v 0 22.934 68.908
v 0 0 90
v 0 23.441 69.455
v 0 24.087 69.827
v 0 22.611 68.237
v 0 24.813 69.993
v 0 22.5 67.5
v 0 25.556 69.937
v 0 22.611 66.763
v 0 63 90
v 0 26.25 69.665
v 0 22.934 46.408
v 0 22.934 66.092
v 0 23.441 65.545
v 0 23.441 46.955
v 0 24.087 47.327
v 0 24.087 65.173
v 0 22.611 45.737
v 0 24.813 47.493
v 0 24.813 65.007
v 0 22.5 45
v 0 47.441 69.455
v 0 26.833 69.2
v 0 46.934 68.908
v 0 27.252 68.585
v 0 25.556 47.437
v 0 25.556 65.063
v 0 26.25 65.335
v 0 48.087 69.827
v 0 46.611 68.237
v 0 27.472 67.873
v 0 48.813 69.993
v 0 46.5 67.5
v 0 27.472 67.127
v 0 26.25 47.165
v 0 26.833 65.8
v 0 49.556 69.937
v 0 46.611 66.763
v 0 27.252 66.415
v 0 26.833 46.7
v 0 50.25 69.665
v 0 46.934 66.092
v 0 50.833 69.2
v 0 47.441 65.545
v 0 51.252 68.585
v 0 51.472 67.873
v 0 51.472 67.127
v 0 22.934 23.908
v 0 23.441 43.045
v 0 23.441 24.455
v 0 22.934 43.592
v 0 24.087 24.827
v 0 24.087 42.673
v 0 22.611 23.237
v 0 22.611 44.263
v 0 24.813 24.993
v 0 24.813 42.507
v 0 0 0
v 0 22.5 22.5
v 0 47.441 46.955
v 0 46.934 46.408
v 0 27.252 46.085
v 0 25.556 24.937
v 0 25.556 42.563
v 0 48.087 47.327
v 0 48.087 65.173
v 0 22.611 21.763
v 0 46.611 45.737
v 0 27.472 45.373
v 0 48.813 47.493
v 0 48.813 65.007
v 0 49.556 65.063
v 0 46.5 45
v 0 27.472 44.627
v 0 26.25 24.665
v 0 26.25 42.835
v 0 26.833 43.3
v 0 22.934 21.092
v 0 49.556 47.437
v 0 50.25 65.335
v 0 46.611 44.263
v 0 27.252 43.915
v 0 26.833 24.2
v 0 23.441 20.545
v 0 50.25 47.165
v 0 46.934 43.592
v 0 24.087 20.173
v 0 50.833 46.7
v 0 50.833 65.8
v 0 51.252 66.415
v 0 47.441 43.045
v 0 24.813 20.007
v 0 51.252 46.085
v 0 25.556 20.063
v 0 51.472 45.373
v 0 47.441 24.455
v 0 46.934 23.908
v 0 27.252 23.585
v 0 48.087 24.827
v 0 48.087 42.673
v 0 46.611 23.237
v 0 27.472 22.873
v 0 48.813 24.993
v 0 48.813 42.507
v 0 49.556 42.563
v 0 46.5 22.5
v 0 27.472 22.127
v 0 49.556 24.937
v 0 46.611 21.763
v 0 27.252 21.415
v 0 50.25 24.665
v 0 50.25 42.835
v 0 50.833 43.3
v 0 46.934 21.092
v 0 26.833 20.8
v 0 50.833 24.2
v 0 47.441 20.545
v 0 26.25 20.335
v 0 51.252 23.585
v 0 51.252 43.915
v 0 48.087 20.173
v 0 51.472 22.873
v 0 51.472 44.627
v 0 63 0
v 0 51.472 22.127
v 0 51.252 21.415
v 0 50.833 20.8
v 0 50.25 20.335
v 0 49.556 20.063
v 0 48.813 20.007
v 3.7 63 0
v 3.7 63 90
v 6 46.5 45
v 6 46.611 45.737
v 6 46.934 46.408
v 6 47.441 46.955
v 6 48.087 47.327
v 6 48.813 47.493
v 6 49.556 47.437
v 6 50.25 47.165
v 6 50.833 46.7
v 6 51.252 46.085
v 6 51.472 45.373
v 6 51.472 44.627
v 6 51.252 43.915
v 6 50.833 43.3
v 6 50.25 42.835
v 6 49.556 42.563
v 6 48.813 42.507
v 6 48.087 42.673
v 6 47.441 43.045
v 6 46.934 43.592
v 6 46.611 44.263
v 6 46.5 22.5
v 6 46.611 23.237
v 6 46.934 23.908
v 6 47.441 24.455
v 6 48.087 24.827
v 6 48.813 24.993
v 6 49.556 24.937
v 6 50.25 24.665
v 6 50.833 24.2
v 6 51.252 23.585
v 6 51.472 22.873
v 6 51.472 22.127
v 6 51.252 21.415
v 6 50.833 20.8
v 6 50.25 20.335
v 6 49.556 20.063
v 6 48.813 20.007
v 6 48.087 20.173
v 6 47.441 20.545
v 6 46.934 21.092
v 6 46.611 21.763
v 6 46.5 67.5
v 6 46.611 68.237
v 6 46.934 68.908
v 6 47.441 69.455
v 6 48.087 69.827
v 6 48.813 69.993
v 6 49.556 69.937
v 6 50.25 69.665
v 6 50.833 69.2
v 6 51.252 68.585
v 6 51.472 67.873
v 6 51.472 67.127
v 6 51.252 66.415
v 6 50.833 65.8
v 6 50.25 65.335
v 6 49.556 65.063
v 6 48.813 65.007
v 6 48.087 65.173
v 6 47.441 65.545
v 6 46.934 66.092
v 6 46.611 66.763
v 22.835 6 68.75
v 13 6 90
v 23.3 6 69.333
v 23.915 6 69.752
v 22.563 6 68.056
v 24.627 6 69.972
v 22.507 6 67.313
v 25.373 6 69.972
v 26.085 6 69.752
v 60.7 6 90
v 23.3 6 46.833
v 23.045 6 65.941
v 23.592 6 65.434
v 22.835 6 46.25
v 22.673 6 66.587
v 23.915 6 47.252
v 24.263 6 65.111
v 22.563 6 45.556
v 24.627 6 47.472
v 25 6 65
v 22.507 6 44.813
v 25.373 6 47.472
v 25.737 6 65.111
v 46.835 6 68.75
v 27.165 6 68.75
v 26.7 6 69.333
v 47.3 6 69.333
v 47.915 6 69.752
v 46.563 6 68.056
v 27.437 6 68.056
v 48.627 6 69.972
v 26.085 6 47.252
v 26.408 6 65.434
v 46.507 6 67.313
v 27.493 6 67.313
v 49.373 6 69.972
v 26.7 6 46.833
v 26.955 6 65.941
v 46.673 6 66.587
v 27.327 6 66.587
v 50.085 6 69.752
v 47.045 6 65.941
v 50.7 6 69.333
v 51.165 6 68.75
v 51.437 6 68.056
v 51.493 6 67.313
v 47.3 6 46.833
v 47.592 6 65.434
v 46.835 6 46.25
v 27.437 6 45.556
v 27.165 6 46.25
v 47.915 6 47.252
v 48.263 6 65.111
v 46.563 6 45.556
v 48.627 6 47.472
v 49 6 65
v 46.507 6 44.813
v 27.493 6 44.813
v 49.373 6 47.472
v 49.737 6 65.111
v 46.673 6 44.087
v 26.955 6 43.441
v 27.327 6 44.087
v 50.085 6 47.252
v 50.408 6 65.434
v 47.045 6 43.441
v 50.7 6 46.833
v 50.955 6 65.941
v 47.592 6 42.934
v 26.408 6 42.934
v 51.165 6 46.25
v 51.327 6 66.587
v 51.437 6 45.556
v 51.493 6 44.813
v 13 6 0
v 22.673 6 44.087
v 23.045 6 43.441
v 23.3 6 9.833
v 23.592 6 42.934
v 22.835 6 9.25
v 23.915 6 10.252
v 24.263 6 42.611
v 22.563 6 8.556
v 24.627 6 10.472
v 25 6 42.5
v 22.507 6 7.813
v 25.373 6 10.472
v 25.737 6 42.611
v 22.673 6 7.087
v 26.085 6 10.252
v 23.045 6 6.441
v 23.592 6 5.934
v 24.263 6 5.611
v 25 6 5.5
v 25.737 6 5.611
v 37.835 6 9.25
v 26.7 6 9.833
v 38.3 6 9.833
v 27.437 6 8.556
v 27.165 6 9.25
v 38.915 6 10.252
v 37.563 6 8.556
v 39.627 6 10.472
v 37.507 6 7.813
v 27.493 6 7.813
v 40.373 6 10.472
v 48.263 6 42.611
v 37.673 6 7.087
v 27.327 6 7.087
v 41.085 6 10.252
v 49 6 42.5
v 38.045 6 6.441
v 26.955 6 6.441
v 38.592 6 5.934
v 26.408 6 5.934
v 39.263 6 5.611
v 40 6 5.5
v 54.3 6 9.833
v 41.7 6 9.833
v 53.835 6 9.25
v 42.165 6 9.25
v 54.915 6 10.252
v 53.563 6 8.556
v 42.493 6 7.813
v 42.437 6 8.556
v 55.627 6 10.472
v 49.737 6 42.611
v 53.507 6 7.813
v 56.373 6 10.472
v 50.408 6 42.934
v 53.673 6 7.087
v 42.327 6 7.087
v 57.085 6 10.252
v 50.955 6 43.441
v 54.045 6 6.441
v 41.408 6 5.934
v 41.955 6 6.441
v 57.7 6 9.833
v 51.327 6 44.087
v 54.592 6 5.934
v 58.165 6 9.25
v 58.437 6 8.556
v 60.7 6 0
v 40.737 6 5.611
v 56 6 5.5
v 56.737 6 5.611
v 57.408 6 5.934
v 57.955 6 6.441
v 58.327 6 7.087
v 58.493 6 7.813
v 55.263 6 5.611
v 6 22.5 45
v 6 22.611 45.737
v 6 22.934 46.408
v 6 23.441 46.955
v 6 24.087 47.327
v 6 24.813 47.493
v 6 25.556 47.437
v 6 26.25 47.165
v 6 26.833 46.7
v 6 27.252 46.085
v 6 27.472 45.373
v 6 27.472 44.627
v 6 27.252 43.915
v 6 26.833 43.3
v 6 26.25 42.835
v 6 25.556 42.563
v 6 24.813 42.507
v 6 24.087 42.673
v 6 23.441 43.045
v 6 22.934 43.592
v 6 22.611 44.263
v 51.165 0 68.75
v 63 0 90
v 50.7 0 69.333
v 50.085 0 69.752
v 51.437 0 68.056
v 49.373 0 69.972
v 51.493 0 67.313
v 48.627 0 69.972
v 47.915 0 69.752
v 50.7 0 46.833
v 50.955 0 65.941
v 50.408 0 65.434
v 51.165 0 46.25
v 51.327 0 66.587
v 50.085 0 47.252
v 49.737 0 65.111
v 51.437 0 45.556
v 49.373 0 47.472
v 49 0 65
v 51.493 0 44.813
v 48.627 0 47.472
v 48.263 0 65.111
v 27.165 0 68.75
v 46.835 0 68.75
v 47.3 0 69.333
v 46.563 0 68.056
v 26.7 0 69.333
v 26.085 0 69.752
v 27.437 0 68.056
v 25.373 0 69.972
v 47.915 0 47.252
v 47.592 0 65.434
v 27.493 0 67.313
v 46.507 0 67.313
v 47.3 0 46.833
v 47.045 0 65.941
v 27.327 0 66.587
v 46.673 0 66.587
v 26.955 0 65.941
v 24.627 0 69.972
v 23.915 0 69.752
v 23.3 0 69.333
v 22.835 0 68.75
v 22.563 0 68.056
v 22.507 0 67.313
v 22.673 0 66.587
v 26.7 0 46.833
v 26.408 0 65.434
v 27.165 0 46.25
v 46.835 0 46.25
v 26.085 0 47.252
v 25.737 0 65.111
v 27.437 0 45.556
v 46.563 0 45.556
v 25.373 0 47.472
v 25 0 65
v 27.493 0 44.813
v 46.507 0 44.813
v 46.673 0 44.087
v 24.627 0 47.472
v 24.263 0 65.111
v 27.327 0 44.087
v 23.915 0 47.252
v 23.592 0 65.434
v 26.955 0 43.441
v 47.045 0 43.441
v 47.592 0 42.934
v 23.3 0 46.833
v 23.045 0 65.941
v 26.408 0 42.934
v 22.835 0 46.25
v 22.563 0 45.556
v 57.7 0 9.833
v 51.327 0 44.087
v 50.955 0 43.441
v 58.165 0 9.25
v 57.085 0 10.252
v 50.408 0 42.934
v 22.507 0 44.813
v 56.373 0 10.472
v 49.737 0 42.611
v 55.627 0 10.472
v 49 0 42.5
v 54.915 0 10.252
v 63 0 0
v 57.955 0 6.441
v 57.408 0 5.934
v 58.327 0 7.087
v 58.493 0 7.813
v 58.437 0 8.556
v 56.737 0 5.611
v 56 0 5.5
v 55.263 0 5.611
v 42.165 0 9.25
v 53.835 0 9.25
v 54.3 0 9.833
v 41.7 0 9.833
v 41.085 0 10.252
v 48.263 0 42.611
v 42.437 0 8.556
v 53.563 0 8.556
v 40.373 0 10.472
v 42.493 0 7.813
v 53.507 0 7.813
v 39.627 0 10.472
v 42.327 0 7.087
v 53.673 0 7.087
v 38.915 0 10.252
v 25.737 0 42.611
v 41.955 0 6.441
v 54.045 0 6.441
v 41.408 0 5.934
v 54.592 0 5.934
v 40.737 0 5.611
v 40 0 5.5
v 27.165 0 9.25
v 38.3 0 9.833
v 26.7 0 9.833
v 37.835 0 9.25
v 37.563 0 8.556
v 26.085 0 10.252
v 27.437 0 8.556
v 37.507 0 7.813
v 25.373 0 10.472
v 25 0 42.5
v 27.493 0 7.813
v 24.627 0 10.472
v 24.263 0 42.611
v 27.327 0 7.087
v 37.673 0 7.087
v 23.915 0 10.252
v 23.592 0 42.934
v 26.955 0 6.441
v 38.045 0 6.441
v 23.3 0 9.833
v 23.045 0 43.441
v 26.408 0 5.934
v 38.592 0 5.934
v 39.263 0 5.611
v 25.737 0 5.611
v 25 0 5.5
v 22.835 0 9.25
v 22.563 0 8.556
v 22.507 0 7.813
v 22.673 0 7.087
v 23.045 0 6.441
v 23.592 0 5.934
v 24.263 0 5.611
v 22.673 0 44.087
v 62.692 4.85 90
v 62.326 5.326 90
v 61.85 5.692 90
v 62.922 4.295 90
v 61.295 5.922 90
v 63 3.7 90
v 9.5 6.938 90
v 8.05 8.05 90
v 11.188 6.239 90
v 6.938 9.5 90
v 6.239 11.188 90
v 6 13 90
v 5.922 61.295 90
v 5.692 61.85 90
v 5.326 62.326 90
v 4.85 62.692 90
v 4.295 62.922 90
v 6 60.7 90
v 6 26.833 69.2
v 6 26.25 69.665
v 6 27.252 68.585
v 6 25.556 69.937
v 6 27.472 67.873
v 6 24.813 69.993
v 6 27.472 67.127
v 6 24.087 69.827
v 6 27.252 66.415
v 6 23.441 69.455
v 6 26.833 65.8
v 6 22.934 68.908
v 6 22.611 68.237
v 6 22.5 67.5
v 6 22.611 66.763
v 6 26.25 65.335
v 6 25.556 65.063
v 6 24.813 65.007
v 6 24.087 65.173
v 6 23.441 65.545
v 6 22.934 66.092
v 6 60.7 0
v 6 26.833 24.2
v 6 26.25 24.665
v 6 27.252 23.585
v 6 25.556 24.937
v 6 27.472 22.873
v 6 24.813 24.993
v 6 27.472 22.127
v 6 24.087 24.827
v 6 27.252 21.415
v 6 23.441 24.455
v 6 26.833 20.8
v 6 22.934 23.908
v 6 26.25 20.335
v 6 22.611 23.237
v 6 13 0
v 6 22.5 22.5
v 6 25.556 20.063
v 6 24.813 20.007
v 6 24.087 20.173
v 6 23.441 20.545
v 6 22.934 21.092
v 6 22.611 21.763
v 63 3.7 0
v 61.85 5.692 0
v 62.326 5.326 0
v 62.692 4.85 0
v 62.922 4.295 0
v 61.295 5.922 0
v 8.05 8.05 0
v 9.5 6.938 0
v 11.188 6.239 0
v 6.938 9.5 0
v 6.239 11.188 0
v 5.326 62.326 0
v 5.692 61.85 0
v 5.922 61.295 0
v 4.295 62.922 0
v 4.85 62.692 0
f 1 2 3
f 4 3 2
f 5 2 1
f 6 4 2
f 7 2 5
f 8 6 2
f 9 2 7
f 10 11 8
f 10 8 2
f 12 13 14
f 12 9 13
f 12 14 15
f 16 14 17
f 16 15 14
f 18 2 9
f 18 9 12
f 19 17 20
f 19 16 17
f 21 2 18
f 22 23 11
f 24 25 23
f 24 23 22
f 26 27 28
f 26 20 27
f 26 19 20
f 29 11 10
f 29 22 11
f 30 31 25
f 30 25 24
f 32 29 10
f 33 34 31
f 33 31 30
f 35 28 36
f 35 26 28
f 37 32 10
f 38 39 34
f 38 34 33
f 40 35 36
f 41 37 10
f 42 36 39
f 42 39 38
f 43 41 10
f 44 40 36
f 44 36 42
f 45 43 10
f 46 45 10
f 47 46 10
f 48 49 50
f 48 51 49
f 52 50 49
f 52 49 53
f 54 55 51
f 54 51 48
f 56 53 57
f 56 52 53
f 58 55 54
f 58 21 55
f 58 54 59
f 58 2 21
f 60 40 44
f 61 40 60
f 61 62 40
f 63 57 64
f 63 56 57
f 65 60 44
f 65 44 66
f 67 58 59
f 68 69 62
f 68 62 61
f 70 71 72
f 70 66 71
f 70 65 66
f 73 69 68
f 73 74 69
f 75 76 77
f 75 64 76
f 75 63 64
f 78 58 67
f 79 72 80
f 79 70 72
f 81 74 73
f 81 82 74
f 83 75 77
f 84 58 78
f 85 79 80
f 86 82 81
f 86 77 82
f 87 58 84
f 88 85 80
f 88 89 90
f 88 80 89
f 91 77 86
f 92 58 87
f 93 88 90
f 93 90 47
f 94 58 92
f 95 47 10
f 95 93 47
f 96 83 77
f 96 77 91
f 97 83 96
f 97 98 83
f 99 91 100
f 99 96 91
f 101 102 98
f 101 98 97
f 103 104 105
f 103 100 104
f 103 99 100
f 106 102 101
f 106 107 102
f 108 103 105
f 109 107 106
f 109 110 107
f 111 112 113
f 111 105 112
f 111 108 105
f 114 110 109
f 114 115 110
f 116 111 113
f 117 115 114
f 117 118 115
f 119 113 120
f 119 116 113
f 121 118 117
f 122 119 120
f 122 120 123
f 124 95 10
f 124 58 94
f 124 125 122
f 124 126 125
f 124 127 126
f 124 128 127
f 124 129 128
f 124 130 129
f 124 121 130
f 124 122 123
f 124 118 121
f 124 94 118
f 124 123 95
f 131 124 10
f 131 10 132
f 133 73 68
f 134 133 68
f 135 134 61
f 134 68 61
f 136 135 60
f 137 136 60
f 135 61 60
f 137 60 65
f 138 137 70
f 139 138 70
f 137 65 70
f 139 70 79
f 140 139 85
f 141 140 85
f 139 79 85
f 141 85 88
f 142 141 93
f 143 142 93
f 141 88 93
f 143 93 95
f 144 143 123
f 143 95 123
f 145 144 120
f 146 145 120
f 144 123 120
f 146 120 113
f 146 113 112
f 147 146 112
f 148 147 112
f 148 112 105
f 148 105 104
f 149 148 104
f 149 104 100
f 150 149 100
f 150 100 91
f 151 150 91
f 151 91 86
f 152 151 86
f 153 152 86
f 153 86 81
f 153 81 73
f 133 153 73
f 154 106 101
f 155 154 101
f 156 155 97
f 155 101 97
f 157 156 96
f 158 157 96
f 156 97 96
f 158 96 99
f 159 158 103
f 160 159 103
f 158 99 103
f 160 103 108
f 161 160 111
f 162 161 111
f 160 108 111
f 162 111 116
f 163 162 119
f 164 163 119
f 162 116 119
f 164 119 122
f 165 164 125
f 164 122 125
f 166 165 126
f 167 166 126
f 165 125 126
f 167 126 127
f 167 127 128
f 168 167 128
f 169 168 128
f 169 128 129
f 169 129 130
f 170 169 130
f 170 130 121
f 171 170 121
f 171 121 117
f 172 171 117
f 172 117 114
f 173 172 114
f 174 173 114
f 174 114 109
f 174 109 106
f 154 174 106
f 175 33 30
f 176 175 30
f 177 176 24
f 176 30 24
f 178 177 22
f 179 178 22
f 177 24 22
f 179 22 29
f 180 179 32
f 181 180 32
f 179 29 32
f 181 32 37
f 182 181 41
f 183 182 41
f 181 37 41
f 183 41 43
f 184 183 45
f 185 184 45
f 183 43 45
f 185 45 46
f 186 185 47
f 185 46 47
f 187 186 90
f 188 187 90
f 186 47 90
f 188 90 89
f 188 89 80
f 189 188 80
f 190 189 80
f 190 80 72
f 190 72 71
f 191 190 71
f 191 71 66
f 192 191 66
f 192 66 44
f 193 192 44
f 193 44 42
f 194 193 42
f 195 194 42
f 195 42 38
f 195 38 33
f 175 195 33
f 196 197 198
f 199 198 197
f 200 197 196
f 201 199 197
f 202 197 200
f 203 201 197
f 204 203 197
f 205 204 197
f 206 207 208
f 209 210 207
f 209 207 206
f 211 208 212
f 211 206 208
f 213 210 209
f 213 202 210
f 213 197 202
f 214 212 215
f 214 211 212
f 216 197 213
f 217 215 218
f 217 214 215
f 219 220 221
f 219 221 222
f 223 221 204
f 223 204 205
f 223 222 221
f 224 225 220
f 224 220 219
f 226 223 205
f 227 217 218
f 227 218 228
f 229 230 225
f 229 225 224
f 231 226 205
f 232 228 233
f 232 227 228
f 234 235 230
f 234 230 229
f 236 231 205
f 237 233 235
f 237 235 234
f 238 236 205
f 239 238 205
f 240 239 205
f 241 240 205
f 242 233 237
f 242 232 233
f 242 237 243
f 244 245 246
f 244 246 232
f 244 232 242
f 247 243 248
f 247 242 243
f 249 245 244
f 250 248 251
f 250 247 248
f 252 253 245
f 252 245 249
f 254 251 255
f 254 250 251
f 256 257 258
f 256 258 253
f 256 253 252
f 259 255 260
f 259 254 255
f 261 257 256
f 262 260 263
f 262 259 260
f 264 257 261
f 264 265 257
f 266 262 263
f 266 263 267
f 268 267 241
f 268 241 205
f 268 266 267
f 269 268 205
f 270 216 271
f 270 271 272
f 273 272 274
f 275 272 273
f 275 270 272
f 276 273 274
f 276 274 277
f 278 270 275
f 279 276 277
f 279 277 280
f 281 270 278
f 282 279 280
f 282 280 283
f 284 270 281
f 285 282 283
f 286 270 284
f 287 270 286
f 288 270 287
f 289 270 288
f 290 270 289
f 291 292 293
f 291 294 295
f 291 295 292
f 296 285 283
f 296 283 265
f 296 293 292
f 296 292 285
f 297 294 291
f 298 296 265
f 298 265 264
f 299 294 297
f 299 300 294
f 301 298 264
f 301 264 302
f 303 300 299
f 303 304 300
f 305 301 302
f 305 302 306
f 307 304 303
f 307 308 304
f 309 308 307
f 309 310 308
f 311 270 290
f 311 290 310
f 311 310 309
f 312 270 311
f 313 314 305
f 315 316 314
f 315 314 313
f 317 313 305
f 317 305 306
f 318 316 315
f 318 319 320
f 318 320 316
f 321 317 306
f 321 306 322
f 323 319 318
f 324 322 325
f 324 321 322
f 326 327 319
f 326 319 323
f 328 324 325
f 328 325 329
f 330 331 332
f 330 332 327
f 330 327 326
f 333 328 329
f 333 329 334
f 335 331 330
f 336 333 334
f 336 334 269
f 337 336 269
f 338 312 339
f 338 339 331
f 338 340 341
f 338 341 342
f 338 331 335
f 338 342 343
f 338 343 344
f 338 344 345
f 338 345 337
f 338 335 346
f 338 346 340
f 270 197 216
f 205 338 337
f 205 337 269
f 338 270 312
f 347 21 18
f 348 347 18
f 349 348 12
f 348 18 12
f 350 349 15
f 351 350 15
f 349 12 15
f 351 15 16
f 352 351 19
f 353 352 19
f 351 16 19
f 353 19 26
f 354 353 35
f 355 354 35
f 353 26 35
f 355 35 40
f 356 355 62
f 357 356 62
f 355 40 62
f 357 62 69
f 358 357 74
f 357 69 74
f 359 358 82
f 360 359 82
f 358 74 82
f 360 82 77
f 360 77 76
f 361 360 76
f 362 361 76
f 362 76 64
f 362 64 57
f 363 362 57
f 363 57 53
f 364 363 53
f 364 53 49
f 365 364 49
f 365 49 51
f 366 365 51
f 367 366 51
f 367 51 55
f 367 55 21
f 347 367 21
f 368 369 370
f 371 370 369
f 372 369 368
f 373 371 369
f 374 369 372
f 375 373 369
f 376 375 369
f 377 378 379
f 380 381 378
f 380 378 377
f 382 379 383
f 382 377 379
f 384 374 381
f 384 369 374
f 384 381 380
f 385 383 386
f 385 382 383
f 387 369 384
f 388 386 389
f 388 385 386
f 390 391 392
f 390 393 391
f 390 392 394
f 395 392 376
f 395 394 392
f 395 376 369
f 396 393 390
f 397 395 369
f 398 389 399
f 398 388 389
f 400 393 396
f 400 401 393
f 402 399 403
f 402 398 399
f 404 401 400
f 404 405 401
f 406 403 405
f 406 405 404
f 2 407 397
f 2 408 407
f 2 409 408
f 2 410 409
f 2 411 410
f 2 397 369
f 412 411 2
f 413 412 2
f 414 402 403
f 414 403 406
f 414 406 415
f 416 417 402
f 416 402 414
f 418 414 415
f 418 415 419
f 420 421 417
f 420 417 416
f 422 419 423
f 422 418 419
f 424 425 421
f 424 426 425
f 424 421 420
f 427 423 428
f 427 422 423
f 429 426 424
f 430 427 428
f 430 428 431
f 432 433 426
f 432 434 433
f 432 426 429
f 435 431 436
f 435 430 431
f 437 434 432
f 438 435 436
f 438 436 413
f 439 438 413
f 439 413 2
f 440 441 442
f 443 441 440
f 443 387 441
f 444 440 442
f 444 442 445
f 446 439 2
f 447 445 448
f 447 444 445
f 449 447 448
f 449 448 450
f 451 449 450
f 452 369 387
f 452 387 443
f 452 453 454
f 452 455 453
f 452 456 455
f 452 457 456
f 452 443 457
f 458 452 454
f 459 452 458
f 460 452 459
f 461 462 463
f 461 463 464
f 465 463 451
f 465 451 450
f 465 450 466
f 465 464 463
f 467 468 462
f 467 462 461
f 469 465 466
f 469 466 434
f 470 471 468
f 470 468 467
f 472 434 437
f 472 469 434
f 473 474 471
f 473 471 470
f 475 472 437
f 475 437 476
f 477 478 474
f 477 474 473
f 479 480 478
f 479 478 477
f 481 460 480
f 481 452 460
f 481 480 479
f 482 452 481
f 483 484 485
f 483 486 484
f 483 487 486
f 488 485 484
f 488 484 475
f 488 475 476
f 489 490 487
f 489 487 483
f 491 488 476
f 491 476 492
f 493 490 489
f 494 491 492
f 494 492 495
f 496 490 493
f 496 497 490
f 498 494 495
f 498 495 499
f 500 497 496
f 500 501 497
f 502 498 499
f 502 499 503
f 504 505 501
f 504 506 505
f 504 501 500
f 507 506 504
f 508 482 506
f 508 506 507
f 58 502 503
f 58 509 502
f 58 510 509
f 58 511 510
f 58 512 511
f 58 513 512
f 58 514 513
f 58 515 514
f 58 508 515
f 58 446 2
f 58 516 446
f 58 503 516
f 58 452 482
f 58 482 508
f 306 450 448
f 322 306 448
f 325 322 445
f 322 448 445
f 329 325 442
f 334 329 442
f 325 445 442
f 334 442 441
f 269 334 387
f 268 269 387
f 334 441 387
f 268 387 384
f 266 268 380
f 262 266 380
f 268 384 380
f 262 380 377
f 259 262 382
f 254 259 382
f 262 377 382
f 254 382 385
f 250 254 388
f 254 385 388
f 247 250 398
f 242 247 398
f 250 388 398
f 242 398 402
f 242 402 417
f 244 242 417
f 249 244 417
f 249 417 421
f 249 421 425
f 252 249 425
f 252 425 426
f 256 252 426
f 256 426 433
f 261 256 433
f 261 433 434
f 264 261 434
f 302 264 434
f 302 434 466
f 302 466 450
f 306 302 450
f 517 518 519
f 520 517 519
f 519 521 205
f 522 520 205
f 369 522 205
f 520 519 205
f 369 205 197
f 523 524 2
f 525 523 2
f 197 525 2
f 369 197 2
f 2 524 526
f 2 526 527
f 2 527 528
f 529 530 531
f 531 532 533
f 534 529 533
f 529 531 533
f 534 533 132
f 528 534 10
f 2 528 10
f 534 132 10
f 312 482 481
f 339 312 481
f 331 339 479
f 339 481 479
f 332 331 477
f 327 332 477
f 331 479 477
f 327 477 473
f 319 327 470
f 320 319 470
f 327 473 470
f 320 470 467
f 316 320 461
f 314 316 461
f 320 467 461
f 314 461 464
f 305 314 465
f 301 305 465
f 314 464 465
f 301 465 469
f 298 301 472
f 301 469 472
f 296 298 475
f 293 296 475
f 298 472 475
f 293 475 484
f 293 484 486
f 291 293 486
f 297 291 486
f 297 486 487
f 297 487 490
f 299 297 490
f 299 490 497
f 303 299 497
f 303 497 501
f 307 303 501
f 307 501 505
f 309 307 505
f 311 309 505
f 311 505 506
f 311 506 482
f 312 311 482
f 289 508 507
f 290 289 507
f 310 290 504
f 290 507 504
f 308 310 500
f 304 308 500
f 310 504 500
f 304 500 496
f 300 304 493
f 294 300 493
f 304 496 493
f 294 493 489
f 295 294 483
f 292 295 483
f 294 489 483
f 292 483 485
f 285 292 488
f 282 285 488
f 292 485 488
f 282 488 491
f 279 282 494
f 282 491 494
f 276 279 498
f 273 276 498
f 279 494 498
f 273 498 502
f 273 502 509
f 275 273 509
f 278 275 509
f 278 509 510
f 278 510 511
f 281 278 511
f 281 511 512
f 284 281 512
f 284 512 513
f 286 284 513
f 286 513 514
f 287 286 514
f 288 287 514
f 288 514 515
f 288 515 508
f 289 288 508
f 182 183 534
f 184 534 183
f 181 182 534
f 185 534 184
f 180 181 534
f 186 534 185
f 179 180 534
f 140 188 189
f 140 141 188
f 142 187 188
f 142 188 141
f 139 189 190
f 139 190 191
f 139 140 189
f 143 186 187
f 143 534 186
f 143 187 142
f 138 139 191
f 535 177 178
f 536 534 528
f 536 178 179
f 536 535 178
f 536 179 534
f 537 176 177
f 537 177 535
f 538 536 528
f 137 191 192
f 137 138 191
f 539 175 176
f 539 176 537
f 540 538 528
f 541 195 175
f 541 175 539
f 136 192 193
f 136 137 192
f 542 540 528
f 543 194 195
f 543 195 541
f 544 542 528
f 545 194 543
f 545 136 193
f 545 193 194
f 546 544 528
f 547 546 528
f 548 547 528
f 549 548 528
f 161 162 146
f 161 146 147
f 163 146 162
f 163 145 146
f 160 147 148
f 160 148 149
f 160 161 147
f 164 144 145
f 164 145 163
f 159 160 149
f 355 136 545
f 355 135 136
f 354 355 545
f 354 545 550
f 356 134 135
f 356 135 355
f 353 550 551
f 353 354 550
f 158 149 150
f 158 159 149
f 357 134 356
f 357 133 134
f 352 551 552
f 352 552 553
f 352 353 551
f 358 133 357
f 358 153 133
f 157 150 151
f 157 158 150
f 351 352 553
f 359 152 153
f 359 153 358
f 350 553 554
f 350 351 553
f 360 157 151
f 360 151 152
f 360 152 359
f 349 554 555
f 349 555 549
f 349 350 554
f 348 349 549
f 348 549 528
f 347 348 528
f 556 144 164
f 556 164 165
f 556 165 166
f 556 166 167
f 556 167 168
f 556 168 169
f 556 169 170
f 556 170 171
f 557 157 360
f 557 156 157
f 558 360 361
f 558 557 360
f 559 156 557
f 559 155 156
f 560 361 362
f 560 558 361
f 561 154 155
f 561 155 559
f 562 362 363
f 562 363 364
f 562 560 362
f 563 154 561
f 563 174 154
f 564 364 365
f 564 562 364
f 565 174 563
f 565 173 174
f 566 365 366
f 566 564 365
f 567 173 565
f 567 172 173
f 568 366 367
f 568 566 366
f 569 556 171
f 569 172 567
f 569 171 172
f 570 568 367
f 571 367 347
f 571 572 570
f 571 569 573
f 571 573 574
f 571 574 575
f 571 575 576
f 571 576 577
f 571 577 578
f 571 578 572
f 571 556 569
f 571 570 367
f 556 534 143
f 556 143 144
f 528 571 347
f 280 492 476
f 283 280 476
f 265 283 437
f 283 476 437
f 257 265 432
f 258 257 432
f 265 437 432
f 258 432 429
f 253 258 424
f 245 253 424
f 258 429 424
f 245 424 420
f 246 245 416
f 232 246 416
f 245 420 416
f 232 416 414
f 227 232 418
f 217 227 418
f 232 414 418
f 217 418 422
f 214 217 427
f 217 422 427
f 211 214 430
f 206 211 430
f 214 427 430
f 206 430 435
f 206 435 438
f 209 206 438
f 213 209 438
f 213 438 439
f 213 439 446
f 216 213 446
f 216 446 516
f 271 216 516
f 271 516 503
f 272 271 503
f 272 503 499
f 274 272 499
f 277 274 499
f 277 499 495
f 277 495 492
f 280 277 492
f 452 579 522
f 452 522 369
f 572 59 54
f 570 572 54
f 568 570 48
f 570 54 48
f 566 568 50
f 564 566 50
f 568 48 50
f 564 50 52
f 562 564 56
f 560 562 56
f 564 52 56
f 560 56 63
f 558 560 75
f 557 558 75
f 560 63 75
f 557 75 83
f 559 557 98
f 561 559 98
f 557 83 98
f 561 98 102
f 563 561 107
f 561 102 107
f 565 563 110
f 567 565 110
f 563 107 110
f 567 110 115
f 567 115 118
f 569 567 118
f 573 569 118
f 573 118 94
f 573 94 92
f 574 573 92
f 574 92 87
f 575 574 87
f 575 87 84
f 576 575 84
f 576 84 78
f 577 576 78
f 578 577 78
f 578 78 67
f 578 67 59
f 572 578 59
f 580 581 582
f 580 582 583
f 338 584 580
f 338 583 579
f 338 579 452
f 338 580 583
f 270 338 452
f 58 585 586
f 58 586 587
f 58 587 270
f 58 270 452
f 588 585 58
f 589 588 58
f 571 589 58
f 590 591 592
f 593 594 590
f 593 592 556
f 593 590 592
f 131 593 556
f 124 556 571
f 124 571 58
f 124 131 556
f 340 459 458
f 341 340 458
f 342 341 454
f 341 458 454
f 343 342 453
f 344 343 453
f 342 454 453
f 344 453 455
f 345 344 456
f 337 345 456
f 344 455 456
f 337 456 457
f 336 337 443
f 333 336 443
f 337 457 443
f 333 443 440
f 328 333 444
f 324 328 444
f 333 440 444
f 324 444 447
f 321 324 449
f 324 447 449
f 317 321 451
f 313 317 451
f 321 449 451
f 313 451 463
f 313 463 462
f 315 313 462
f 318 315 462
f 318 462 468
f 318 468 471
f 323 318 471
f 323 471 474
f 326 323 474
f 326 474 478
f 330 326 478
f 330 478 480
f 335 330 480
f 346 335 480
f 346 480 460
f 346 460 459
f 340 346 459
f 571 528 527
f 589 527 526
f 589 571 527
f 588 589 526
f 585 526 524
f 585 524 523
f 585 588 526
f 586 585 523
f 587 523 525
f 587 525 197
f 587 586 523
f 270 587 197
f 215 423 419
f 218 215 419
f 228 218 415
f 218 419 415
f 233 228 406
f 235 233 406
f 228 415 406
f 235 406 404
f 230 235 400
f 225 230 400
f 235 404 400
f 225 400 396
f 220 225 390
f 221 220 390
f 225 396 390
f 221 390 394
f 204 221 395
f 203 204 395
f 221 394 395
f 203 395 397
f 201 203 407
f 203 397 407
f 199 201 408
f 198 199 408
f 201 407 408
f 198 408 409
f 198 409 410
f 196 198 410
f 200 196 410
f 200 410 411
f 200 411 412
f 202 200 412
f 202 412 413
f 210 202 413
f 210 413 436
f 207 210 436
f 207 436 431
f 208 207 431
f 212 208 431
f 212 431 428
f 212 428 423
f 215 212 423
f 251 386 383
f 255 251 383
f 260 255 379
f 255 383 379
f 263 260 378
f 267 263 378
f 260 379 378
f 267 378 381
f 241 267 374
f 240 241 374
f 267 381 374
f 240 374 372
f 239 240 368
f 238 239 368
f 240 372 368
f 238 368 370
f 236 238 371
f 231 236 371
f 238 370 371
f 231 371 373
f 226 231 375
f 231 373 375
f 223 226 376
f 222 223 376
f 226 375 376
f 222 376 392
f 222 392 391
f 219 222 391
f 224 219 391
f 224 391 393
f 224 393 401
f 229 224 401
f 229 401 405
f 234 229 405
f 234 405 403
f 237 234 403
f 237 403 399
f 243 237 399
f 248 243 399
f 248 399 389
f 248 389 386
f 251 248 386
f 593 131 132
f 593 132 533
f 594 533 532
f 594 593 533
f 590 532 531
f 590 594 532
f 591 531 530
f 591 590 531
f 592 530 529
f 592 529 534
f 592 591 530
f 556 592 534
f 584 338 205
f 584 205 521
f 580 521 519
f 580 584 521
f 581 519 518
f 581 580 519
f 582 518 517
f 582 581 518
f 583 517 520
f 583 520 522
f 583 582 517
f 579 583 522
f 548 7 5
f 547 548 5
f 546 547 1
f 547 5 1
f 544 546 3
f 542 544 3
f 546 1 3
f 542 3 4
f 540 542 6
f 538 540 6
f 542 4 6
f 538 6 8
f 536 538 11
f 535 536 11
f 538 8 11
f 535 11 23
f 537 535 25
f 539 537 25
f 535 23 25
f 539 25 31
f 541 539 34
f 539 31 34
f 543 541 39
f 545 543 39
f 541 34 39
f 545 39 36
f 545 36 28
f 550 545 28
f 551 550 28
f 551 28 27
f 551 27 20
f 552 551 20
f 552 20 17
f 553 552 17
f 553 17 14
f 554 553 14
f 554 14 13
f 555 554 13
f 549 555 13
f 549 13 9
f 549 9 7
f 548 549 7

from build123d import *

# Parameters (mm, degrees)
AUFSATZ_LINEAR_AUSTRAGEN1_DEPTH = 90
F_5_0_5_DURCHMESSER_BOHRUNG1_D  = 5
F_5_0_5_DURCHMESSER_BOHRUNG2_D  = 5


with BuildPart() as part:
    # Skizze2 → Aufsatz-Linear austragen1 (new body)
    with BuildSketch(Plane.XY):
        with BuildLine():
            ThreePointArc((6, 13), (8.050252532, 8.050252532), (13, 6))
            Line((13, 6), (60.7, 6))
            ThreePointArc((60.7, 6), (62.326345597, 5.326345597), (63, 3.7))
            Line((63, 3.7), (63, 0))
            Line((63, 0), (0, 0))
            Line((0, 0), (0, 63))
            Line((0, 63), (3.7, 63))
            ThreePointArc((3.7, 63), (5.326345597, 62.326345597), (6, 60.7))
            Line((6, 60.7), (6, 13))
        make_face()
    extrude(amount=AUFSATZ_LINEAR_AUSTRAGEN1_DEPTH)

    # Ø5.0 (5) Durchmesser Bohrung1 (through all)
    with Locations(Plane(origin=(6, 25, 67.5), x_dir=(0, 1, 0), z_dir=(1, 0, 0))):
        with Locations((0, 0), (24, 0), (24, -22.5), (0, -22.5), (0, -45), (24, -45)):
            Hole(F_5_0_5_DURCHMESSER_BOHRUNG1_D / 2)

    # Ø5.0 (5) Durchmesser Bohrung2 (through all)
    with Locations(Plane(origin=(49, 6, 67.5), x_dir=(0, 0, 1), z_dir=(0, 1, 0))):
        with Locations((0, 0), (-22.5, 0), (-22.5, -24), (0, -24), (-59.5, -24), (-59.5, -9), (-59.5, 7)):
            Hole(F_5_0_5_DURCHMESSER_BOHRUNG2_D / 2)


solid = part.part
